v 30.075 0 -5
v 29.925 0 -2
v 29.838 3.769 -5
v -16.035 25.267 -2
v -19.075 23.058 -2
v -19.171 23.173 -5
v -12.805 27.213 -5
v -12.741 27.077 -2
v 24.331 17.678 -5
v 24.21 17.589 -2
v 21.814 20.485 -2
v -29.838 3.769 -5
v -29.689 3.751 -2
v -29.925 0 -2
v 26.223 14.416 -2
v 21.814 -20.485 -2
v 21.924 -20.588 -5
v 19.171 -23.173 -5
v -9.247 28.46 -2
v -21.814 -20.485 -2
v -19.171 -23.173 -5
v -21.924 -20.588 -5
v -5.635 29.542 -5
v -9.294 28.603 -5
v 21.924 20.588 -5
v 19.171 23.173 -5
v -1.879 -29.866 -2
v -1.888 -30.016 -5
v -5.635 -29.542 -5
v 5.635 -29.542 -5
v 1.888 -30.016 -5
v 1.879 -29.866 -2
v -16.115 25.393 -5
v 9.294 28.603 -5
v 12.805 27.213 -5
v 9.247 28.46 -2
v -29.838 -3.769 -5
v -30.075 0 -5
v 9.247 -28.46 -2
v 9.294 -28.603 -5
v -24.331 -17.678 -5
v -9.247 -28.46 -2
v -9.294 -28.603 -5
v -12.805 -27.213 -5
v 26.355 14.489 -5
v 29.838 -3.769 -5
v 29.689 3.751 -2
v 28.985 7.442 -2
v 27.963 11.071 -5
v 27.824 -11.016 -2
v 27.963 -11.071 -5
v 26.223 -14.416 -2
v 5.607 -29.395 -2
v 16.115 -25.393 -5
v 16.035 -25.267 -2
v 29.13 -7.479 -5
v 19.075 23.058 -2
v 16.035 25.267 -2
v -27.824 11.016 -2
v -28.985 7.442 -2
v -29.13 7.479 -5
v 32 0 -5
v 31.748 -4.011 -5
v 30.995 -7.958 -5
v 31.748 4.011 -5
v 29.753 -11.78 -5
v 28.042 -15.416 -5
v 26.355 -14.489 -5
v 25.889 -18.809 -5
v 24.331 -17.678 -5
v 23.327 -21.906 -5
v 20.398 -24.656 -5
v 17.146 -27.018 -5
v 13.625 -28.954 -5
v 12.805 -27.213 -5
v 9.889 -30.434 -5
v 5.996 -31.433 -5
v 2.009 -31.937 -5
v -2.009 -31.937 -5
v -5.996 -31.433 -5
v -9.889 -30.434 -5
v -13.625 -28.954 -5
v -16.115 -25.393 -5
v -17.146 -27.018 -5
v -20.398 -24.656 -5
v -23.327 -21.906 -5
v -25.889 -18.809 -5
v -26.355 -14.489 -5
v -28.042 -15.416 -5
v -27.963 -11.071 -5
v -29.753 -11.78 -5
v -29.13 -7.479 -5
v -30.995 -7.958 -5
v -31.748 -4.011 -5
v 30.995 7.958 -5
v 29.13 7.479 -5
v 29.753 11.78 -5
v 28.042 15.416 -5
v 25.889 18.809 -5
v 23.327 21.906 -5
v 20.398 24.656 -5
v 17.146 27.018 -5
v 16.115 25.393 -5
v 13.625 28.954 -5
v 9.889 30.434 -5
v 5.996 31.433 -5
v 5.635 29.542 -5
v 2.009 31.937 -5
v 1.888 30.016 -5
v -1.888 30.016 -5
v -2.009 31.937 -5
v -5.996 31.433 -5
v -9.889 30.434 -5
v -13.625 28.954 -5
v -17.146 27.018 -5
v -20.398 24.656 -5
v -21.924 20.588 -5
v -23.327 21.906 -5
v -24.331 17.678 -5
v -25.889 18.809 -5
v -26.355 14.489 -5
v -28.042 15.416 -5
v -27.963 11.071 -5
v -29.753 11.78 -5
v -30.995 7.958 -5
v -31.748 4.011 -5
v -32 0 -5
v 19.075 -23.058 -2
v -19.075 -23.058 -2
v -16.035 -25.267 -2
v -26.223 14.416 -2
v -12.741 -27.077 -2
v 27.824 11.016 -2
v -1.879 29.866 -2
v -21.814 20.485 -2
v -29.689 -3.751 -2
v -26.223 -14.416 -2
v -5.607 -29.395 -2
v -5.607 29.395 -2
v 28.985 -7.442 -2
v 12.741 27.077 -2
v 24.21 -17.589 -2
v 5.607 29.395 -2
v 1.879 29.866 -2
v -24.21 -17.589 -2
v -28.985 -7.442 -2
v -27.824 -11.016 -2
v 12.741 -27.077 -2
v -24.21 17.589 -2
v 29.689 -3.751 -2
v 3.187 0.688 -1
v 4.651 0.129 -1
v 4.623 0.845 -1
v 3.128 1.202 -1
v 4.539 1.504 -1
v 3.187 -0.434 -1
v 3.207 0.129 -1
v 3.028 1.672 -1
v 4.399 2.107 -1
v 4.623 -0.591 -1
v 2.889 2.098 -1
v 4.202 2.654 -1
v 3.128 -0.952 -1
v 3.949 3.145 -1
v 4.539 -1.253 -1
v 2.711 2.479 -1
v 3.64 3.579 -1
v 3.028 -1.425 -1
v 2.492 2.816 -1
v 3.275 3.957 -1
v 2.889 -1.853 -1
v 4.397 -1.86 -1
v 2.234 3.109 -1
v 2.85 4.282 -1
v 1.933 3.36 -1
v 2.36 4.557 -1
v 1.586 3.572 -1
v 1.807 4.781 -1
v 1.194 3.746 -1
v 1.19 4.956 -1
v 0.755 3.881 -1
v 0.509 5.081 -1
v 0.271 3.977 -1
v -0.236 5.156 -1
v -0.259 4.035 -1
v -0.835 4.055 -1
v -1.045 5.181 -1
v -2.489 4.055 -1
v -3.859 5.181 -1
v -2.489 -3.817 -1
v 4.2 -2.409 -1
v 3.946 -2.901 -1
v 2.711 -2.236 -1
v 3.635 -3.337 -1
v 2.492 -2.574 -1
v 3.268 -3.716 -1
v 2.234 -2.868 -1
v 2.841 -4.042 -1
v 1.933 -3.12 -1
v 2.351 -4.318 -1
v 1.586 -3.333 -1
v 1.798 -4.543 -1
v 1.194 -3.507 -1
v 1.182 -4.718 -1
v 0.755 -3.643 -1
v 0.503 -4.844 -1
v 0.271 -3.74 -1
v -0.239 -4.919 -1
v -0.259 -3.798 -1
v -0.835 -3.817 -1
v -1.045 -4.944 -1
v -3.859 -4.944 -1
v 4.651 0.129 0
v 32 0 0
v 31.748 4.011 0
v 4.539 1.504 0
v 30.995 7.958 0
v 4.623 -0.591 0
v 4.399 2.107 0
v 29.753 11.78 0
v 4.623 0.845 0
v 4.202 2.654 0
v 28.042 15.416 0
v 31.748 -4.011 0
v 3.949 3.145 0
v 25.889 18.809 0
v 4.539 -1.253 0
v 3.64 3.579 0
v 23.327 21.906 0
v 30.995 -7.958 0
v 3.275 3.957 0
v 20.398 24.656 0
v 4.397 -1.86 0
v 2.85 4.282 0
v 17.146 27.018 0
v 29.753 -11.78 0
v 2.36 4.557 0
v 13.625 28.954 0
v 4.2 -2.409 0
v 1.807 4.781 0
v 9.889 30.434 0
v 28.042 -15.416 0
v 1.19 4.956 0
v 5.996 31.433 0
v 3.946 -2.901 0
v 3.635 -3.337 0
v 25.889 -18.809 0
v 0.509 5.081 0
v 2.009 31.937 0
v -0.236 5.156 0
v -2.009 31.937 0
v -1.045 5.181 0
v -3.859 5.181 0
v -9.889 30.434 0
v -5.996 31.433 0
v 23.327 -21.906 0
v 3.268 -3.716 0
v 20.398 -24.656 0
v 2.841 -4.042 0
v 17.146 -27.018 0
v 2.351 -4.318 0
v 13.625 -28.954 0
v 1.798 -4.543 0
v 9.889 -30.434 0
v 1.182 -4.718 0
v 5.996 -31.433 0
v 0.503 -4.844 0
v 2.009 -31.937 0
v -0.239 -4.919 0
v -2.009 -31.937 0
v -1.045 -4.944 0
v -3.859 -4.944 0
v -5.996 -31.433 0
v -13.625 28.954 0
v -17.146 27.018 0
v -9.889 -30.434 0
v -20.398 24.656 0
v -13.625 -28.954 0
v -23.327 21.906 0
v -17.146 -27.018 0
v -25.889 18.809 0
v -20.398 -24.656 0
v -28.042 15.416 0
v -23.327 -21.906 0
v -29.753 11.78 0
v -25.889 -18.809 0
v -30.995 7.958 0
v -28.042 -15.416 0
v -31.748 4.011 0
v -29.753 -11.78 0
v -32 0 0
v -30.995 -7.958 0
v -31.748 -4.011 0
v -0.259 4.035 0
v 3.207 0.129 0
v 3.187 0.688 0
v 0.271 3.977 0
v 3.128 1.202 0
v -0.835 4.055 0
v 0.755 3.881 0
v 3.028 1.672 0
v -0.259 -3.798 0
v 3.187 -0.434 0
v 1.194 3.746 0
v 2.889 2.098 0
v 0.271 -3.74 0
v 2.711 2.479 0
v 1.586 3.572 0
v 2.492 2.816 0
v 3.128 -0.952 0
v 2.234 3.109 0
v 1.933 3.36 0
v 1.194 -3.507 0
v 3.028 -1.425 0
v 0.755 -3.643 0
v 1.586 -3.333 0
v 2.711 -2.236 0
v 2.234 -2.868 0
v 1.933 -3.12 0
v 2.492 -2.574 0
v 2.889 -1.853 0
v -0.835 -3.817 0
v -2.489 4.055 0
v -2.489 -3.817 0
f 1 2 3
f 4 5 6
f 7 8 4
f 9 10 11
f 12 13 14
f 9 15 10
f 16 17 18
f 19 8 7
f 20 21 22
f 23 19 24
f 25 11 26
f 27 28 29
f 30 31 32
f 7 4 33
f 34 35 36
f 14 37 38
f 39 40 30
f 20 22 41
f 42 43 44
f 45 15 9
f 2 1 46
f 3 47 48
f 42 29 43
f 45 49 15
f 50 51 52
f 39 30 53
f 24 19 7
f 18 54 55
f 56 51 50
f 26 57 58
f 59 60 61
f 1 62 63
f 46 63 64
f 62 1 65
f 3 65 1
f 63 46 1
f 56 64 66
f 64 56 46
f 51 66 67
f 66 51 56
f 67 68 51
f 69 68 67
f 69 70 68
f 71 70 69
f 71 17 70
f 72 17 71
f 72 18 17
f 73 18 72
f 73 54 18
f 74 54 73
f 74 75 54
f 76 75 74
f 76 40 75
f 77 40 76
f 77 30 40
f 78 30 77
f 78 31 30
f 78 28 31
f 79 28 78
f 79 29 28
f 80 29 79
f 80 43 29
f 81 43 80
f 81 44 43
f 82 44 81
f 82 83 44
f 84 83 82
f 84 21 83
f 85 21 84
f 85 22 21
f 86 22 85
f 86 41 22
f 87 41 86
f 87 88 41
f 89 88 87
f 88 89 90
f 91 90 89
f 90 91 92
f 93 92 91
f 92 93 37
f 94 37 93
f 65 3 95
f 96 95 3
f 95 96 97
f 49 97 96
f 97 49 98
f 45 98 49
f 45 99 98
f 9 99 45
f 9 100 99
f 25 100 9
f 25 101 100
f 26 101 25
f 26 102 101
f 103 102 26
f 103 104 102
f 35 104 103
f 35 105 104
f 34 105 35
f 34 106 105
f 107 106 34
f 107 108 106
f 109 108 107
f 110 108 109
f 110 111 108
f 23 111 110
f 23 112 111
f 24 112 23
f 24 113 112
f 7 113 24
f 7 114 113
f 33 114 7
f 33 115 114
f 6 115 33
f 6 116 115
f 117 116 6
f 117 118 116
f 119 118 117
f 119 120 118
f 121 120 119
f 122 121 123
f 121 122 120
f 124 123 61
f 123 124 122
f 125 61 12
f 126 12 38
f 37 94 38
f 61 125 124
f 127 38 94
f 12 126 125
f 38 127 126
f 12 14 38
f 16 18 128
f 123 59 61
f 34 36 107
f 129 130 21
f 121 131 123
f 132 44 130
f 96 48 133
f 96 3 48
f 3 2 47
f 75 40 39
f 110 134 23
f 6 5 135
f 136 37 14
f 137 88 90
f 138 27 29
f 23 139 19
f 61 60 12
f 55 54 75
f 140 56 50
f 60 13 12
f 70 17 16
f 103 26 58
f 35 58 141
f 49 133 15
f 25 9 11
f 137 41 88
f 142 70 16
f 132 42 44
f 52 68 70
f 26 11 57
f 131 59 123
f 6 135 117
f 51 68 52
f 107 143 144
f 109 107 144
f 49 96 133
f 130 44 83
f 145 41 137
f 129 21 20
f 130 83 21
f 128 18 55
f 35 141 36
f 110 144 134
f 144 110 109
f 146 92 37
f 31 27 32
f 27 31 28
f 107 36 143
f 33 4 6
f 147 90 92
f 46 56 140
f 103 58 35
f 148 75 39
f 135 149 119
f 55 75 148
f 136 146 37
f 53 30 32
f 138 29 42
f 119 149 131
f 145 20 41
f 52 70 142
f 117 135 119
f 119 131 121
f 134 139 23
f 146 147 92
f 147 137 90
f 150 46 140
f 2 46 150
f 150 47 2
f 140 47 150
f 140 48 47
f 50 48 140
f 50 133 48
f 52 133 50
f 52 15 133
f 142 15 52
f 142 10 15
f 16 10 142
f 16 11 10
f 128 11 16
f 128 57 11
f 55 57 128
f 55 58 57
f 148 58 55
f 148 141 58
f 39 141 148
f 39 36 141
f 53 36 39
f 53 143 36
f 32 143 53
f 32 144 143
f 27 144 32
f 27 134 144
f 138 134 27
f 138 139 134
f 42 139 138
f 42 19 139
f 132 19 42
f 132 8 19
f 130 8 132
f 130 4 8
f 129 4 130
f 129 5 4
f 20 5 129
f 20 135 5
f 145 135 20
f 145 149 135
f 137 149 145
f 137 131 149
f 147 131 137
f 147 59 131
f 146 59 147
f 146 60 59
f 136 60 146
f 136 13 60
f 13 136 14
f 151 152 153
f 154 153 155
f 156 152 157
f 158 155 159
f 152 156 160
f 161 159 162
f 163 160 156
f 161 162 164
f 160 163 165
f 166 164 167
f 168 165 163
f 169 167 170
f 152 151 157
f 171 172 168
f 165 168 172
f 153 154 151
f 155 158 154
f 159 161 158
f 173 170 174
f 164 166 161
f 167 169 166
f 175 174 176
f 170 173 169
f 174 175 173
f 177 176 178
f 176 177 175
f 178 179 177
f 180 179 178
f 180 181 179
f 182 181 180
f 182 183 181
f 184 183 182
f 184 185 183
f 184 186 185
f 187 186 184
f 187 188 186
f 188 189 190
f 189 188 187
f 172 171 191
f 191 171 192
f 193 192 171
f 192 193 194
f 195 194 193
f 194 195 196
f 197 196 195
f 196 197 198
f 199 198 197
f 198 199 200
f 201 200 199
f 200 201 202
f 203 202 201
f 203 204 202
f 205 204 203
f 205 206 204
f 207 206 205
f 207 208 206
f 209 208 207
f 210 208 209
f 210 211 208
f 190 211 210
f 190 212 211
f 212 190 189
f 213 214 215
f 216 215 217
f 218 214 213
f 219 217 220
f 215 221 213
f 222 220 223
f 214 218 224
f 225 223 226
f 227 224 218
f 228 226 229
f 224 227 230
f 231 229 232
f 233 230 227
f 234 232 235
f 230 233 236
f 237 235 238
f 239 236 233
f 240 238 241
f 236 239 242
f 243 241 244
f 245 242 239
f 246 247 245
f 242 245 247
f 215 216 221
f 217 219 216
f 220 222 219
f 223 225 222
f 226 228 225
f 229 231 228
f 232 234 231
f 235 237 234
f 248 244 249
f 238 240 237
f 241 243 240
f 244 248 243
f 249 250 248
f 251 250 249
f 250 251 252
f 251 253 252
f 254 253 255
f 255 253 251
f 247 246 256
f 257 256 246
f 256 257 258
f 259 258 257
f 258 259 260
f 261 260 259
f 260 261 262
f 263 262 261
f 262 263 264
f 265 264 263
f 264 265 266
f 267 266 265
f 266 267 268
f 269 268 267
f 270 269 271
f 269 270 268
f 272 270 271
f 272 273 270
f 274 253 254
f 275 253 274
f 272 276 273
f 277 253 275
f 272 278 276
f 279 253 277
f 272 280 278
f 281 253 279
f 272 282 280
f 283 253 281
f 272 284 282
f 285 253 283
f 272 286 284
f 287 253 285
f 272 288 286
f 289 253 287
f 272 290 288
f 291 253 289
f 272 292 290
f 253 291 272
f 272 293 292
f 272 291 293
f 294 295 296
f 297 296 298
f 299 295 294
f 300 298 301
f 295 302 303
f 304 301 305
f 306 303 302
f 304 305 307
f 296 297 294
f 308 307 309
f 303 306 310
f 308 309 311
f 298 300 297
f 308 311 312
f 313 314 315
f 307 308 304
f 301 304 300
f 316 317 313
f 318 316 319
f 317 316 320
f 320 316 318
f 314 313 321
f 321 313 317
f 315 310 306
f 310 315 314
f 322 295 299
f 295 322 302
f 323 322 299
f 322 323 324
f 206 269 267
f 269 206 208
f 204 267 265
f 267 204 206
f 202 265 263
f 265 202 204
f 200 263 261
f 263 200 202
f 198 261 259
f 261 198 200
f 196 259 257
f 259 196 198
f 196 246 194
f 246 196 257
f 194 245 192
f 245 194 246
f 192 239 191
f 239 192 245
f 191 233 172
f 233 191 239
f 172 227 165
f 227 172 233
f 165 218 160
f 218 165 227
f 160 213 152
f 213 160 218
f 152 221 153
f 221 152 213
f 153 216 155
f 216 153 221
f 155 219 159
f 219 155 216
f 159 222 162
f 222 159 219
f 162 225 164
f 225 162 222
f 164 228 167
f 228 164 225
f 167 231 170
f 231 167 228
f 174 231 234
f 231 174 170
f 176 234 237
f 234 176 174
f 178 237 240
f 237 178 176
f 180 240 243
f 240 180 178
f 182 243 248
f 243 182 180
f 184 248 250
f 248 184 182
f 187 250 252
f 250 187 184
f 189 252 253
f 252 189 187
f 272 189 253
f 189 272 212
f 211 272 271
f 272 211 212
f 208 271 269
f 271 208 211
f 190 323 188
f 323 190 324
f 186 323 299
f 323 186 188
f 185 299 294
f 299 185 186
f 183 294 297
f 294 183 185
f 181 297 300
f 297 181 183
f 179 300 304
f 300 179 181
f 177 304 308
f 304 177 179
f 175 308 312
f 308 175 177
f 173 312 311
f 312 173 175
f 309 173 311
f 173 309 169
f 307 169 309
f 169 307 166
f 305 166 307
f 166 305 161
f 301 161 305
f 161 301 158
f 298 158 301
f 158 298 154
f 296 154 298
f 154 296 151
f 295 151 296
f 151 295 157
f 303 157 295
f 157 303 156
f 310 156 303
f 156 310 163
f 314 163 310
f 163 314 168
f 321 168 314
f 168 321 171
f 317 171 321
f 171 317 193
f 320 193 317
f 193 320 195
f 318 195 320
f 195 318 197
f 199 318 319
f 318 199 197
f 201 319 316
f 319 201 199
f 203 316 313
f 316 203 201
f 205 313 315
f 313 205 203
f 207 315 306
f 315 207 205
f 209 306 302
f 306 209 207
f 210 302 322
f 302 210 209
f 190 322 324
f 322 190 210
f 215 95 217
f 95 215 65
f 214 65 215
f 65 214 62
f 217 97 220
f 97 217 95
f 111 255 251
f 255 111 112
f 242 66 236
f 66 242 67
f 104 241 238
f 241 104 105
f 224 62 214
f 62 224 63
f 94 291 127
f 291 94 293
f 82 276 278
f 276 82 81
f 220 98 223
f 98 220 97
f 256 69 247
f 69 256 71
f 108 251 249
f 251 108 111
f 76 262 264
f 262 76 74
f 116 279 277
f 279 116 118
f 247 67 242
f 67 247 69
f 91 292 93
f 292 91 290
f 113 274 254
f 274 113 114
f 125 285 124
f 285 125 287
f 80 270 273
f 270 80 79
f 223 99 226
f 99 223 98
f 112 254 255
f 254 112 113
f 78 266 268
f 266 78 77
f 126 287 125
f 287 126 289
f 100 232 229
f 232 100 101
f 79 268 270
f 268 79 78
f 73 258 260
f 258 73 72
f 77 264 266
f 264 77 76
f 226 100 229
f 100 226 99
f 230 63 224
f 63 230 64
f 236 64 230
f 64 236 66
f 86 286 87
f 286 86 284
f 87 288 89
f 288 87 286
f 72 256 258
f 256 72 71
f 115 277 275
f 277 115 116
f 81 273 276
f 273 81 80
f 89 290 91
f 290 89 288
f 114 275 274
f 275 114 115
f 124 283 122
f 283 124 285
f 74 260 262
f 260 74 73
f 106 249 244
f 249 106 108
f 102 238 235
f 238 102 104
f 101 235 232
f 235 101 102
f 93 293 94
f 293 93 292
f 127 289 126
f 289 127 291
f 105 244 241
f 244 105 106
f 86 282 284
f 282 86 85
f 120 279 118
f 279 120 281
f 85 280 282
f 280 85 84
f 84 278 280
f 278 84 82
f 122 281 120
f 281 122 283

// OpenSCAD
$fn = 50;

difference() {
	union() {
		translate(v = [0, 0, -5.0]) {
			cylinder(h = 5, r = 32.0);
		}
	}
	union() {
		#translate(v = [0, 0, -5.0]) {
			cylinder(h = 3, r1 = 30.075, r2 = 29.925);
		}
		translate(v = [0, 0, -1]) {
			linear_extrude(height = 1) {
				text(font = "Impact", halign = "center", size = 10, text = "D", valign = "center");
			}
		}
	}
}
